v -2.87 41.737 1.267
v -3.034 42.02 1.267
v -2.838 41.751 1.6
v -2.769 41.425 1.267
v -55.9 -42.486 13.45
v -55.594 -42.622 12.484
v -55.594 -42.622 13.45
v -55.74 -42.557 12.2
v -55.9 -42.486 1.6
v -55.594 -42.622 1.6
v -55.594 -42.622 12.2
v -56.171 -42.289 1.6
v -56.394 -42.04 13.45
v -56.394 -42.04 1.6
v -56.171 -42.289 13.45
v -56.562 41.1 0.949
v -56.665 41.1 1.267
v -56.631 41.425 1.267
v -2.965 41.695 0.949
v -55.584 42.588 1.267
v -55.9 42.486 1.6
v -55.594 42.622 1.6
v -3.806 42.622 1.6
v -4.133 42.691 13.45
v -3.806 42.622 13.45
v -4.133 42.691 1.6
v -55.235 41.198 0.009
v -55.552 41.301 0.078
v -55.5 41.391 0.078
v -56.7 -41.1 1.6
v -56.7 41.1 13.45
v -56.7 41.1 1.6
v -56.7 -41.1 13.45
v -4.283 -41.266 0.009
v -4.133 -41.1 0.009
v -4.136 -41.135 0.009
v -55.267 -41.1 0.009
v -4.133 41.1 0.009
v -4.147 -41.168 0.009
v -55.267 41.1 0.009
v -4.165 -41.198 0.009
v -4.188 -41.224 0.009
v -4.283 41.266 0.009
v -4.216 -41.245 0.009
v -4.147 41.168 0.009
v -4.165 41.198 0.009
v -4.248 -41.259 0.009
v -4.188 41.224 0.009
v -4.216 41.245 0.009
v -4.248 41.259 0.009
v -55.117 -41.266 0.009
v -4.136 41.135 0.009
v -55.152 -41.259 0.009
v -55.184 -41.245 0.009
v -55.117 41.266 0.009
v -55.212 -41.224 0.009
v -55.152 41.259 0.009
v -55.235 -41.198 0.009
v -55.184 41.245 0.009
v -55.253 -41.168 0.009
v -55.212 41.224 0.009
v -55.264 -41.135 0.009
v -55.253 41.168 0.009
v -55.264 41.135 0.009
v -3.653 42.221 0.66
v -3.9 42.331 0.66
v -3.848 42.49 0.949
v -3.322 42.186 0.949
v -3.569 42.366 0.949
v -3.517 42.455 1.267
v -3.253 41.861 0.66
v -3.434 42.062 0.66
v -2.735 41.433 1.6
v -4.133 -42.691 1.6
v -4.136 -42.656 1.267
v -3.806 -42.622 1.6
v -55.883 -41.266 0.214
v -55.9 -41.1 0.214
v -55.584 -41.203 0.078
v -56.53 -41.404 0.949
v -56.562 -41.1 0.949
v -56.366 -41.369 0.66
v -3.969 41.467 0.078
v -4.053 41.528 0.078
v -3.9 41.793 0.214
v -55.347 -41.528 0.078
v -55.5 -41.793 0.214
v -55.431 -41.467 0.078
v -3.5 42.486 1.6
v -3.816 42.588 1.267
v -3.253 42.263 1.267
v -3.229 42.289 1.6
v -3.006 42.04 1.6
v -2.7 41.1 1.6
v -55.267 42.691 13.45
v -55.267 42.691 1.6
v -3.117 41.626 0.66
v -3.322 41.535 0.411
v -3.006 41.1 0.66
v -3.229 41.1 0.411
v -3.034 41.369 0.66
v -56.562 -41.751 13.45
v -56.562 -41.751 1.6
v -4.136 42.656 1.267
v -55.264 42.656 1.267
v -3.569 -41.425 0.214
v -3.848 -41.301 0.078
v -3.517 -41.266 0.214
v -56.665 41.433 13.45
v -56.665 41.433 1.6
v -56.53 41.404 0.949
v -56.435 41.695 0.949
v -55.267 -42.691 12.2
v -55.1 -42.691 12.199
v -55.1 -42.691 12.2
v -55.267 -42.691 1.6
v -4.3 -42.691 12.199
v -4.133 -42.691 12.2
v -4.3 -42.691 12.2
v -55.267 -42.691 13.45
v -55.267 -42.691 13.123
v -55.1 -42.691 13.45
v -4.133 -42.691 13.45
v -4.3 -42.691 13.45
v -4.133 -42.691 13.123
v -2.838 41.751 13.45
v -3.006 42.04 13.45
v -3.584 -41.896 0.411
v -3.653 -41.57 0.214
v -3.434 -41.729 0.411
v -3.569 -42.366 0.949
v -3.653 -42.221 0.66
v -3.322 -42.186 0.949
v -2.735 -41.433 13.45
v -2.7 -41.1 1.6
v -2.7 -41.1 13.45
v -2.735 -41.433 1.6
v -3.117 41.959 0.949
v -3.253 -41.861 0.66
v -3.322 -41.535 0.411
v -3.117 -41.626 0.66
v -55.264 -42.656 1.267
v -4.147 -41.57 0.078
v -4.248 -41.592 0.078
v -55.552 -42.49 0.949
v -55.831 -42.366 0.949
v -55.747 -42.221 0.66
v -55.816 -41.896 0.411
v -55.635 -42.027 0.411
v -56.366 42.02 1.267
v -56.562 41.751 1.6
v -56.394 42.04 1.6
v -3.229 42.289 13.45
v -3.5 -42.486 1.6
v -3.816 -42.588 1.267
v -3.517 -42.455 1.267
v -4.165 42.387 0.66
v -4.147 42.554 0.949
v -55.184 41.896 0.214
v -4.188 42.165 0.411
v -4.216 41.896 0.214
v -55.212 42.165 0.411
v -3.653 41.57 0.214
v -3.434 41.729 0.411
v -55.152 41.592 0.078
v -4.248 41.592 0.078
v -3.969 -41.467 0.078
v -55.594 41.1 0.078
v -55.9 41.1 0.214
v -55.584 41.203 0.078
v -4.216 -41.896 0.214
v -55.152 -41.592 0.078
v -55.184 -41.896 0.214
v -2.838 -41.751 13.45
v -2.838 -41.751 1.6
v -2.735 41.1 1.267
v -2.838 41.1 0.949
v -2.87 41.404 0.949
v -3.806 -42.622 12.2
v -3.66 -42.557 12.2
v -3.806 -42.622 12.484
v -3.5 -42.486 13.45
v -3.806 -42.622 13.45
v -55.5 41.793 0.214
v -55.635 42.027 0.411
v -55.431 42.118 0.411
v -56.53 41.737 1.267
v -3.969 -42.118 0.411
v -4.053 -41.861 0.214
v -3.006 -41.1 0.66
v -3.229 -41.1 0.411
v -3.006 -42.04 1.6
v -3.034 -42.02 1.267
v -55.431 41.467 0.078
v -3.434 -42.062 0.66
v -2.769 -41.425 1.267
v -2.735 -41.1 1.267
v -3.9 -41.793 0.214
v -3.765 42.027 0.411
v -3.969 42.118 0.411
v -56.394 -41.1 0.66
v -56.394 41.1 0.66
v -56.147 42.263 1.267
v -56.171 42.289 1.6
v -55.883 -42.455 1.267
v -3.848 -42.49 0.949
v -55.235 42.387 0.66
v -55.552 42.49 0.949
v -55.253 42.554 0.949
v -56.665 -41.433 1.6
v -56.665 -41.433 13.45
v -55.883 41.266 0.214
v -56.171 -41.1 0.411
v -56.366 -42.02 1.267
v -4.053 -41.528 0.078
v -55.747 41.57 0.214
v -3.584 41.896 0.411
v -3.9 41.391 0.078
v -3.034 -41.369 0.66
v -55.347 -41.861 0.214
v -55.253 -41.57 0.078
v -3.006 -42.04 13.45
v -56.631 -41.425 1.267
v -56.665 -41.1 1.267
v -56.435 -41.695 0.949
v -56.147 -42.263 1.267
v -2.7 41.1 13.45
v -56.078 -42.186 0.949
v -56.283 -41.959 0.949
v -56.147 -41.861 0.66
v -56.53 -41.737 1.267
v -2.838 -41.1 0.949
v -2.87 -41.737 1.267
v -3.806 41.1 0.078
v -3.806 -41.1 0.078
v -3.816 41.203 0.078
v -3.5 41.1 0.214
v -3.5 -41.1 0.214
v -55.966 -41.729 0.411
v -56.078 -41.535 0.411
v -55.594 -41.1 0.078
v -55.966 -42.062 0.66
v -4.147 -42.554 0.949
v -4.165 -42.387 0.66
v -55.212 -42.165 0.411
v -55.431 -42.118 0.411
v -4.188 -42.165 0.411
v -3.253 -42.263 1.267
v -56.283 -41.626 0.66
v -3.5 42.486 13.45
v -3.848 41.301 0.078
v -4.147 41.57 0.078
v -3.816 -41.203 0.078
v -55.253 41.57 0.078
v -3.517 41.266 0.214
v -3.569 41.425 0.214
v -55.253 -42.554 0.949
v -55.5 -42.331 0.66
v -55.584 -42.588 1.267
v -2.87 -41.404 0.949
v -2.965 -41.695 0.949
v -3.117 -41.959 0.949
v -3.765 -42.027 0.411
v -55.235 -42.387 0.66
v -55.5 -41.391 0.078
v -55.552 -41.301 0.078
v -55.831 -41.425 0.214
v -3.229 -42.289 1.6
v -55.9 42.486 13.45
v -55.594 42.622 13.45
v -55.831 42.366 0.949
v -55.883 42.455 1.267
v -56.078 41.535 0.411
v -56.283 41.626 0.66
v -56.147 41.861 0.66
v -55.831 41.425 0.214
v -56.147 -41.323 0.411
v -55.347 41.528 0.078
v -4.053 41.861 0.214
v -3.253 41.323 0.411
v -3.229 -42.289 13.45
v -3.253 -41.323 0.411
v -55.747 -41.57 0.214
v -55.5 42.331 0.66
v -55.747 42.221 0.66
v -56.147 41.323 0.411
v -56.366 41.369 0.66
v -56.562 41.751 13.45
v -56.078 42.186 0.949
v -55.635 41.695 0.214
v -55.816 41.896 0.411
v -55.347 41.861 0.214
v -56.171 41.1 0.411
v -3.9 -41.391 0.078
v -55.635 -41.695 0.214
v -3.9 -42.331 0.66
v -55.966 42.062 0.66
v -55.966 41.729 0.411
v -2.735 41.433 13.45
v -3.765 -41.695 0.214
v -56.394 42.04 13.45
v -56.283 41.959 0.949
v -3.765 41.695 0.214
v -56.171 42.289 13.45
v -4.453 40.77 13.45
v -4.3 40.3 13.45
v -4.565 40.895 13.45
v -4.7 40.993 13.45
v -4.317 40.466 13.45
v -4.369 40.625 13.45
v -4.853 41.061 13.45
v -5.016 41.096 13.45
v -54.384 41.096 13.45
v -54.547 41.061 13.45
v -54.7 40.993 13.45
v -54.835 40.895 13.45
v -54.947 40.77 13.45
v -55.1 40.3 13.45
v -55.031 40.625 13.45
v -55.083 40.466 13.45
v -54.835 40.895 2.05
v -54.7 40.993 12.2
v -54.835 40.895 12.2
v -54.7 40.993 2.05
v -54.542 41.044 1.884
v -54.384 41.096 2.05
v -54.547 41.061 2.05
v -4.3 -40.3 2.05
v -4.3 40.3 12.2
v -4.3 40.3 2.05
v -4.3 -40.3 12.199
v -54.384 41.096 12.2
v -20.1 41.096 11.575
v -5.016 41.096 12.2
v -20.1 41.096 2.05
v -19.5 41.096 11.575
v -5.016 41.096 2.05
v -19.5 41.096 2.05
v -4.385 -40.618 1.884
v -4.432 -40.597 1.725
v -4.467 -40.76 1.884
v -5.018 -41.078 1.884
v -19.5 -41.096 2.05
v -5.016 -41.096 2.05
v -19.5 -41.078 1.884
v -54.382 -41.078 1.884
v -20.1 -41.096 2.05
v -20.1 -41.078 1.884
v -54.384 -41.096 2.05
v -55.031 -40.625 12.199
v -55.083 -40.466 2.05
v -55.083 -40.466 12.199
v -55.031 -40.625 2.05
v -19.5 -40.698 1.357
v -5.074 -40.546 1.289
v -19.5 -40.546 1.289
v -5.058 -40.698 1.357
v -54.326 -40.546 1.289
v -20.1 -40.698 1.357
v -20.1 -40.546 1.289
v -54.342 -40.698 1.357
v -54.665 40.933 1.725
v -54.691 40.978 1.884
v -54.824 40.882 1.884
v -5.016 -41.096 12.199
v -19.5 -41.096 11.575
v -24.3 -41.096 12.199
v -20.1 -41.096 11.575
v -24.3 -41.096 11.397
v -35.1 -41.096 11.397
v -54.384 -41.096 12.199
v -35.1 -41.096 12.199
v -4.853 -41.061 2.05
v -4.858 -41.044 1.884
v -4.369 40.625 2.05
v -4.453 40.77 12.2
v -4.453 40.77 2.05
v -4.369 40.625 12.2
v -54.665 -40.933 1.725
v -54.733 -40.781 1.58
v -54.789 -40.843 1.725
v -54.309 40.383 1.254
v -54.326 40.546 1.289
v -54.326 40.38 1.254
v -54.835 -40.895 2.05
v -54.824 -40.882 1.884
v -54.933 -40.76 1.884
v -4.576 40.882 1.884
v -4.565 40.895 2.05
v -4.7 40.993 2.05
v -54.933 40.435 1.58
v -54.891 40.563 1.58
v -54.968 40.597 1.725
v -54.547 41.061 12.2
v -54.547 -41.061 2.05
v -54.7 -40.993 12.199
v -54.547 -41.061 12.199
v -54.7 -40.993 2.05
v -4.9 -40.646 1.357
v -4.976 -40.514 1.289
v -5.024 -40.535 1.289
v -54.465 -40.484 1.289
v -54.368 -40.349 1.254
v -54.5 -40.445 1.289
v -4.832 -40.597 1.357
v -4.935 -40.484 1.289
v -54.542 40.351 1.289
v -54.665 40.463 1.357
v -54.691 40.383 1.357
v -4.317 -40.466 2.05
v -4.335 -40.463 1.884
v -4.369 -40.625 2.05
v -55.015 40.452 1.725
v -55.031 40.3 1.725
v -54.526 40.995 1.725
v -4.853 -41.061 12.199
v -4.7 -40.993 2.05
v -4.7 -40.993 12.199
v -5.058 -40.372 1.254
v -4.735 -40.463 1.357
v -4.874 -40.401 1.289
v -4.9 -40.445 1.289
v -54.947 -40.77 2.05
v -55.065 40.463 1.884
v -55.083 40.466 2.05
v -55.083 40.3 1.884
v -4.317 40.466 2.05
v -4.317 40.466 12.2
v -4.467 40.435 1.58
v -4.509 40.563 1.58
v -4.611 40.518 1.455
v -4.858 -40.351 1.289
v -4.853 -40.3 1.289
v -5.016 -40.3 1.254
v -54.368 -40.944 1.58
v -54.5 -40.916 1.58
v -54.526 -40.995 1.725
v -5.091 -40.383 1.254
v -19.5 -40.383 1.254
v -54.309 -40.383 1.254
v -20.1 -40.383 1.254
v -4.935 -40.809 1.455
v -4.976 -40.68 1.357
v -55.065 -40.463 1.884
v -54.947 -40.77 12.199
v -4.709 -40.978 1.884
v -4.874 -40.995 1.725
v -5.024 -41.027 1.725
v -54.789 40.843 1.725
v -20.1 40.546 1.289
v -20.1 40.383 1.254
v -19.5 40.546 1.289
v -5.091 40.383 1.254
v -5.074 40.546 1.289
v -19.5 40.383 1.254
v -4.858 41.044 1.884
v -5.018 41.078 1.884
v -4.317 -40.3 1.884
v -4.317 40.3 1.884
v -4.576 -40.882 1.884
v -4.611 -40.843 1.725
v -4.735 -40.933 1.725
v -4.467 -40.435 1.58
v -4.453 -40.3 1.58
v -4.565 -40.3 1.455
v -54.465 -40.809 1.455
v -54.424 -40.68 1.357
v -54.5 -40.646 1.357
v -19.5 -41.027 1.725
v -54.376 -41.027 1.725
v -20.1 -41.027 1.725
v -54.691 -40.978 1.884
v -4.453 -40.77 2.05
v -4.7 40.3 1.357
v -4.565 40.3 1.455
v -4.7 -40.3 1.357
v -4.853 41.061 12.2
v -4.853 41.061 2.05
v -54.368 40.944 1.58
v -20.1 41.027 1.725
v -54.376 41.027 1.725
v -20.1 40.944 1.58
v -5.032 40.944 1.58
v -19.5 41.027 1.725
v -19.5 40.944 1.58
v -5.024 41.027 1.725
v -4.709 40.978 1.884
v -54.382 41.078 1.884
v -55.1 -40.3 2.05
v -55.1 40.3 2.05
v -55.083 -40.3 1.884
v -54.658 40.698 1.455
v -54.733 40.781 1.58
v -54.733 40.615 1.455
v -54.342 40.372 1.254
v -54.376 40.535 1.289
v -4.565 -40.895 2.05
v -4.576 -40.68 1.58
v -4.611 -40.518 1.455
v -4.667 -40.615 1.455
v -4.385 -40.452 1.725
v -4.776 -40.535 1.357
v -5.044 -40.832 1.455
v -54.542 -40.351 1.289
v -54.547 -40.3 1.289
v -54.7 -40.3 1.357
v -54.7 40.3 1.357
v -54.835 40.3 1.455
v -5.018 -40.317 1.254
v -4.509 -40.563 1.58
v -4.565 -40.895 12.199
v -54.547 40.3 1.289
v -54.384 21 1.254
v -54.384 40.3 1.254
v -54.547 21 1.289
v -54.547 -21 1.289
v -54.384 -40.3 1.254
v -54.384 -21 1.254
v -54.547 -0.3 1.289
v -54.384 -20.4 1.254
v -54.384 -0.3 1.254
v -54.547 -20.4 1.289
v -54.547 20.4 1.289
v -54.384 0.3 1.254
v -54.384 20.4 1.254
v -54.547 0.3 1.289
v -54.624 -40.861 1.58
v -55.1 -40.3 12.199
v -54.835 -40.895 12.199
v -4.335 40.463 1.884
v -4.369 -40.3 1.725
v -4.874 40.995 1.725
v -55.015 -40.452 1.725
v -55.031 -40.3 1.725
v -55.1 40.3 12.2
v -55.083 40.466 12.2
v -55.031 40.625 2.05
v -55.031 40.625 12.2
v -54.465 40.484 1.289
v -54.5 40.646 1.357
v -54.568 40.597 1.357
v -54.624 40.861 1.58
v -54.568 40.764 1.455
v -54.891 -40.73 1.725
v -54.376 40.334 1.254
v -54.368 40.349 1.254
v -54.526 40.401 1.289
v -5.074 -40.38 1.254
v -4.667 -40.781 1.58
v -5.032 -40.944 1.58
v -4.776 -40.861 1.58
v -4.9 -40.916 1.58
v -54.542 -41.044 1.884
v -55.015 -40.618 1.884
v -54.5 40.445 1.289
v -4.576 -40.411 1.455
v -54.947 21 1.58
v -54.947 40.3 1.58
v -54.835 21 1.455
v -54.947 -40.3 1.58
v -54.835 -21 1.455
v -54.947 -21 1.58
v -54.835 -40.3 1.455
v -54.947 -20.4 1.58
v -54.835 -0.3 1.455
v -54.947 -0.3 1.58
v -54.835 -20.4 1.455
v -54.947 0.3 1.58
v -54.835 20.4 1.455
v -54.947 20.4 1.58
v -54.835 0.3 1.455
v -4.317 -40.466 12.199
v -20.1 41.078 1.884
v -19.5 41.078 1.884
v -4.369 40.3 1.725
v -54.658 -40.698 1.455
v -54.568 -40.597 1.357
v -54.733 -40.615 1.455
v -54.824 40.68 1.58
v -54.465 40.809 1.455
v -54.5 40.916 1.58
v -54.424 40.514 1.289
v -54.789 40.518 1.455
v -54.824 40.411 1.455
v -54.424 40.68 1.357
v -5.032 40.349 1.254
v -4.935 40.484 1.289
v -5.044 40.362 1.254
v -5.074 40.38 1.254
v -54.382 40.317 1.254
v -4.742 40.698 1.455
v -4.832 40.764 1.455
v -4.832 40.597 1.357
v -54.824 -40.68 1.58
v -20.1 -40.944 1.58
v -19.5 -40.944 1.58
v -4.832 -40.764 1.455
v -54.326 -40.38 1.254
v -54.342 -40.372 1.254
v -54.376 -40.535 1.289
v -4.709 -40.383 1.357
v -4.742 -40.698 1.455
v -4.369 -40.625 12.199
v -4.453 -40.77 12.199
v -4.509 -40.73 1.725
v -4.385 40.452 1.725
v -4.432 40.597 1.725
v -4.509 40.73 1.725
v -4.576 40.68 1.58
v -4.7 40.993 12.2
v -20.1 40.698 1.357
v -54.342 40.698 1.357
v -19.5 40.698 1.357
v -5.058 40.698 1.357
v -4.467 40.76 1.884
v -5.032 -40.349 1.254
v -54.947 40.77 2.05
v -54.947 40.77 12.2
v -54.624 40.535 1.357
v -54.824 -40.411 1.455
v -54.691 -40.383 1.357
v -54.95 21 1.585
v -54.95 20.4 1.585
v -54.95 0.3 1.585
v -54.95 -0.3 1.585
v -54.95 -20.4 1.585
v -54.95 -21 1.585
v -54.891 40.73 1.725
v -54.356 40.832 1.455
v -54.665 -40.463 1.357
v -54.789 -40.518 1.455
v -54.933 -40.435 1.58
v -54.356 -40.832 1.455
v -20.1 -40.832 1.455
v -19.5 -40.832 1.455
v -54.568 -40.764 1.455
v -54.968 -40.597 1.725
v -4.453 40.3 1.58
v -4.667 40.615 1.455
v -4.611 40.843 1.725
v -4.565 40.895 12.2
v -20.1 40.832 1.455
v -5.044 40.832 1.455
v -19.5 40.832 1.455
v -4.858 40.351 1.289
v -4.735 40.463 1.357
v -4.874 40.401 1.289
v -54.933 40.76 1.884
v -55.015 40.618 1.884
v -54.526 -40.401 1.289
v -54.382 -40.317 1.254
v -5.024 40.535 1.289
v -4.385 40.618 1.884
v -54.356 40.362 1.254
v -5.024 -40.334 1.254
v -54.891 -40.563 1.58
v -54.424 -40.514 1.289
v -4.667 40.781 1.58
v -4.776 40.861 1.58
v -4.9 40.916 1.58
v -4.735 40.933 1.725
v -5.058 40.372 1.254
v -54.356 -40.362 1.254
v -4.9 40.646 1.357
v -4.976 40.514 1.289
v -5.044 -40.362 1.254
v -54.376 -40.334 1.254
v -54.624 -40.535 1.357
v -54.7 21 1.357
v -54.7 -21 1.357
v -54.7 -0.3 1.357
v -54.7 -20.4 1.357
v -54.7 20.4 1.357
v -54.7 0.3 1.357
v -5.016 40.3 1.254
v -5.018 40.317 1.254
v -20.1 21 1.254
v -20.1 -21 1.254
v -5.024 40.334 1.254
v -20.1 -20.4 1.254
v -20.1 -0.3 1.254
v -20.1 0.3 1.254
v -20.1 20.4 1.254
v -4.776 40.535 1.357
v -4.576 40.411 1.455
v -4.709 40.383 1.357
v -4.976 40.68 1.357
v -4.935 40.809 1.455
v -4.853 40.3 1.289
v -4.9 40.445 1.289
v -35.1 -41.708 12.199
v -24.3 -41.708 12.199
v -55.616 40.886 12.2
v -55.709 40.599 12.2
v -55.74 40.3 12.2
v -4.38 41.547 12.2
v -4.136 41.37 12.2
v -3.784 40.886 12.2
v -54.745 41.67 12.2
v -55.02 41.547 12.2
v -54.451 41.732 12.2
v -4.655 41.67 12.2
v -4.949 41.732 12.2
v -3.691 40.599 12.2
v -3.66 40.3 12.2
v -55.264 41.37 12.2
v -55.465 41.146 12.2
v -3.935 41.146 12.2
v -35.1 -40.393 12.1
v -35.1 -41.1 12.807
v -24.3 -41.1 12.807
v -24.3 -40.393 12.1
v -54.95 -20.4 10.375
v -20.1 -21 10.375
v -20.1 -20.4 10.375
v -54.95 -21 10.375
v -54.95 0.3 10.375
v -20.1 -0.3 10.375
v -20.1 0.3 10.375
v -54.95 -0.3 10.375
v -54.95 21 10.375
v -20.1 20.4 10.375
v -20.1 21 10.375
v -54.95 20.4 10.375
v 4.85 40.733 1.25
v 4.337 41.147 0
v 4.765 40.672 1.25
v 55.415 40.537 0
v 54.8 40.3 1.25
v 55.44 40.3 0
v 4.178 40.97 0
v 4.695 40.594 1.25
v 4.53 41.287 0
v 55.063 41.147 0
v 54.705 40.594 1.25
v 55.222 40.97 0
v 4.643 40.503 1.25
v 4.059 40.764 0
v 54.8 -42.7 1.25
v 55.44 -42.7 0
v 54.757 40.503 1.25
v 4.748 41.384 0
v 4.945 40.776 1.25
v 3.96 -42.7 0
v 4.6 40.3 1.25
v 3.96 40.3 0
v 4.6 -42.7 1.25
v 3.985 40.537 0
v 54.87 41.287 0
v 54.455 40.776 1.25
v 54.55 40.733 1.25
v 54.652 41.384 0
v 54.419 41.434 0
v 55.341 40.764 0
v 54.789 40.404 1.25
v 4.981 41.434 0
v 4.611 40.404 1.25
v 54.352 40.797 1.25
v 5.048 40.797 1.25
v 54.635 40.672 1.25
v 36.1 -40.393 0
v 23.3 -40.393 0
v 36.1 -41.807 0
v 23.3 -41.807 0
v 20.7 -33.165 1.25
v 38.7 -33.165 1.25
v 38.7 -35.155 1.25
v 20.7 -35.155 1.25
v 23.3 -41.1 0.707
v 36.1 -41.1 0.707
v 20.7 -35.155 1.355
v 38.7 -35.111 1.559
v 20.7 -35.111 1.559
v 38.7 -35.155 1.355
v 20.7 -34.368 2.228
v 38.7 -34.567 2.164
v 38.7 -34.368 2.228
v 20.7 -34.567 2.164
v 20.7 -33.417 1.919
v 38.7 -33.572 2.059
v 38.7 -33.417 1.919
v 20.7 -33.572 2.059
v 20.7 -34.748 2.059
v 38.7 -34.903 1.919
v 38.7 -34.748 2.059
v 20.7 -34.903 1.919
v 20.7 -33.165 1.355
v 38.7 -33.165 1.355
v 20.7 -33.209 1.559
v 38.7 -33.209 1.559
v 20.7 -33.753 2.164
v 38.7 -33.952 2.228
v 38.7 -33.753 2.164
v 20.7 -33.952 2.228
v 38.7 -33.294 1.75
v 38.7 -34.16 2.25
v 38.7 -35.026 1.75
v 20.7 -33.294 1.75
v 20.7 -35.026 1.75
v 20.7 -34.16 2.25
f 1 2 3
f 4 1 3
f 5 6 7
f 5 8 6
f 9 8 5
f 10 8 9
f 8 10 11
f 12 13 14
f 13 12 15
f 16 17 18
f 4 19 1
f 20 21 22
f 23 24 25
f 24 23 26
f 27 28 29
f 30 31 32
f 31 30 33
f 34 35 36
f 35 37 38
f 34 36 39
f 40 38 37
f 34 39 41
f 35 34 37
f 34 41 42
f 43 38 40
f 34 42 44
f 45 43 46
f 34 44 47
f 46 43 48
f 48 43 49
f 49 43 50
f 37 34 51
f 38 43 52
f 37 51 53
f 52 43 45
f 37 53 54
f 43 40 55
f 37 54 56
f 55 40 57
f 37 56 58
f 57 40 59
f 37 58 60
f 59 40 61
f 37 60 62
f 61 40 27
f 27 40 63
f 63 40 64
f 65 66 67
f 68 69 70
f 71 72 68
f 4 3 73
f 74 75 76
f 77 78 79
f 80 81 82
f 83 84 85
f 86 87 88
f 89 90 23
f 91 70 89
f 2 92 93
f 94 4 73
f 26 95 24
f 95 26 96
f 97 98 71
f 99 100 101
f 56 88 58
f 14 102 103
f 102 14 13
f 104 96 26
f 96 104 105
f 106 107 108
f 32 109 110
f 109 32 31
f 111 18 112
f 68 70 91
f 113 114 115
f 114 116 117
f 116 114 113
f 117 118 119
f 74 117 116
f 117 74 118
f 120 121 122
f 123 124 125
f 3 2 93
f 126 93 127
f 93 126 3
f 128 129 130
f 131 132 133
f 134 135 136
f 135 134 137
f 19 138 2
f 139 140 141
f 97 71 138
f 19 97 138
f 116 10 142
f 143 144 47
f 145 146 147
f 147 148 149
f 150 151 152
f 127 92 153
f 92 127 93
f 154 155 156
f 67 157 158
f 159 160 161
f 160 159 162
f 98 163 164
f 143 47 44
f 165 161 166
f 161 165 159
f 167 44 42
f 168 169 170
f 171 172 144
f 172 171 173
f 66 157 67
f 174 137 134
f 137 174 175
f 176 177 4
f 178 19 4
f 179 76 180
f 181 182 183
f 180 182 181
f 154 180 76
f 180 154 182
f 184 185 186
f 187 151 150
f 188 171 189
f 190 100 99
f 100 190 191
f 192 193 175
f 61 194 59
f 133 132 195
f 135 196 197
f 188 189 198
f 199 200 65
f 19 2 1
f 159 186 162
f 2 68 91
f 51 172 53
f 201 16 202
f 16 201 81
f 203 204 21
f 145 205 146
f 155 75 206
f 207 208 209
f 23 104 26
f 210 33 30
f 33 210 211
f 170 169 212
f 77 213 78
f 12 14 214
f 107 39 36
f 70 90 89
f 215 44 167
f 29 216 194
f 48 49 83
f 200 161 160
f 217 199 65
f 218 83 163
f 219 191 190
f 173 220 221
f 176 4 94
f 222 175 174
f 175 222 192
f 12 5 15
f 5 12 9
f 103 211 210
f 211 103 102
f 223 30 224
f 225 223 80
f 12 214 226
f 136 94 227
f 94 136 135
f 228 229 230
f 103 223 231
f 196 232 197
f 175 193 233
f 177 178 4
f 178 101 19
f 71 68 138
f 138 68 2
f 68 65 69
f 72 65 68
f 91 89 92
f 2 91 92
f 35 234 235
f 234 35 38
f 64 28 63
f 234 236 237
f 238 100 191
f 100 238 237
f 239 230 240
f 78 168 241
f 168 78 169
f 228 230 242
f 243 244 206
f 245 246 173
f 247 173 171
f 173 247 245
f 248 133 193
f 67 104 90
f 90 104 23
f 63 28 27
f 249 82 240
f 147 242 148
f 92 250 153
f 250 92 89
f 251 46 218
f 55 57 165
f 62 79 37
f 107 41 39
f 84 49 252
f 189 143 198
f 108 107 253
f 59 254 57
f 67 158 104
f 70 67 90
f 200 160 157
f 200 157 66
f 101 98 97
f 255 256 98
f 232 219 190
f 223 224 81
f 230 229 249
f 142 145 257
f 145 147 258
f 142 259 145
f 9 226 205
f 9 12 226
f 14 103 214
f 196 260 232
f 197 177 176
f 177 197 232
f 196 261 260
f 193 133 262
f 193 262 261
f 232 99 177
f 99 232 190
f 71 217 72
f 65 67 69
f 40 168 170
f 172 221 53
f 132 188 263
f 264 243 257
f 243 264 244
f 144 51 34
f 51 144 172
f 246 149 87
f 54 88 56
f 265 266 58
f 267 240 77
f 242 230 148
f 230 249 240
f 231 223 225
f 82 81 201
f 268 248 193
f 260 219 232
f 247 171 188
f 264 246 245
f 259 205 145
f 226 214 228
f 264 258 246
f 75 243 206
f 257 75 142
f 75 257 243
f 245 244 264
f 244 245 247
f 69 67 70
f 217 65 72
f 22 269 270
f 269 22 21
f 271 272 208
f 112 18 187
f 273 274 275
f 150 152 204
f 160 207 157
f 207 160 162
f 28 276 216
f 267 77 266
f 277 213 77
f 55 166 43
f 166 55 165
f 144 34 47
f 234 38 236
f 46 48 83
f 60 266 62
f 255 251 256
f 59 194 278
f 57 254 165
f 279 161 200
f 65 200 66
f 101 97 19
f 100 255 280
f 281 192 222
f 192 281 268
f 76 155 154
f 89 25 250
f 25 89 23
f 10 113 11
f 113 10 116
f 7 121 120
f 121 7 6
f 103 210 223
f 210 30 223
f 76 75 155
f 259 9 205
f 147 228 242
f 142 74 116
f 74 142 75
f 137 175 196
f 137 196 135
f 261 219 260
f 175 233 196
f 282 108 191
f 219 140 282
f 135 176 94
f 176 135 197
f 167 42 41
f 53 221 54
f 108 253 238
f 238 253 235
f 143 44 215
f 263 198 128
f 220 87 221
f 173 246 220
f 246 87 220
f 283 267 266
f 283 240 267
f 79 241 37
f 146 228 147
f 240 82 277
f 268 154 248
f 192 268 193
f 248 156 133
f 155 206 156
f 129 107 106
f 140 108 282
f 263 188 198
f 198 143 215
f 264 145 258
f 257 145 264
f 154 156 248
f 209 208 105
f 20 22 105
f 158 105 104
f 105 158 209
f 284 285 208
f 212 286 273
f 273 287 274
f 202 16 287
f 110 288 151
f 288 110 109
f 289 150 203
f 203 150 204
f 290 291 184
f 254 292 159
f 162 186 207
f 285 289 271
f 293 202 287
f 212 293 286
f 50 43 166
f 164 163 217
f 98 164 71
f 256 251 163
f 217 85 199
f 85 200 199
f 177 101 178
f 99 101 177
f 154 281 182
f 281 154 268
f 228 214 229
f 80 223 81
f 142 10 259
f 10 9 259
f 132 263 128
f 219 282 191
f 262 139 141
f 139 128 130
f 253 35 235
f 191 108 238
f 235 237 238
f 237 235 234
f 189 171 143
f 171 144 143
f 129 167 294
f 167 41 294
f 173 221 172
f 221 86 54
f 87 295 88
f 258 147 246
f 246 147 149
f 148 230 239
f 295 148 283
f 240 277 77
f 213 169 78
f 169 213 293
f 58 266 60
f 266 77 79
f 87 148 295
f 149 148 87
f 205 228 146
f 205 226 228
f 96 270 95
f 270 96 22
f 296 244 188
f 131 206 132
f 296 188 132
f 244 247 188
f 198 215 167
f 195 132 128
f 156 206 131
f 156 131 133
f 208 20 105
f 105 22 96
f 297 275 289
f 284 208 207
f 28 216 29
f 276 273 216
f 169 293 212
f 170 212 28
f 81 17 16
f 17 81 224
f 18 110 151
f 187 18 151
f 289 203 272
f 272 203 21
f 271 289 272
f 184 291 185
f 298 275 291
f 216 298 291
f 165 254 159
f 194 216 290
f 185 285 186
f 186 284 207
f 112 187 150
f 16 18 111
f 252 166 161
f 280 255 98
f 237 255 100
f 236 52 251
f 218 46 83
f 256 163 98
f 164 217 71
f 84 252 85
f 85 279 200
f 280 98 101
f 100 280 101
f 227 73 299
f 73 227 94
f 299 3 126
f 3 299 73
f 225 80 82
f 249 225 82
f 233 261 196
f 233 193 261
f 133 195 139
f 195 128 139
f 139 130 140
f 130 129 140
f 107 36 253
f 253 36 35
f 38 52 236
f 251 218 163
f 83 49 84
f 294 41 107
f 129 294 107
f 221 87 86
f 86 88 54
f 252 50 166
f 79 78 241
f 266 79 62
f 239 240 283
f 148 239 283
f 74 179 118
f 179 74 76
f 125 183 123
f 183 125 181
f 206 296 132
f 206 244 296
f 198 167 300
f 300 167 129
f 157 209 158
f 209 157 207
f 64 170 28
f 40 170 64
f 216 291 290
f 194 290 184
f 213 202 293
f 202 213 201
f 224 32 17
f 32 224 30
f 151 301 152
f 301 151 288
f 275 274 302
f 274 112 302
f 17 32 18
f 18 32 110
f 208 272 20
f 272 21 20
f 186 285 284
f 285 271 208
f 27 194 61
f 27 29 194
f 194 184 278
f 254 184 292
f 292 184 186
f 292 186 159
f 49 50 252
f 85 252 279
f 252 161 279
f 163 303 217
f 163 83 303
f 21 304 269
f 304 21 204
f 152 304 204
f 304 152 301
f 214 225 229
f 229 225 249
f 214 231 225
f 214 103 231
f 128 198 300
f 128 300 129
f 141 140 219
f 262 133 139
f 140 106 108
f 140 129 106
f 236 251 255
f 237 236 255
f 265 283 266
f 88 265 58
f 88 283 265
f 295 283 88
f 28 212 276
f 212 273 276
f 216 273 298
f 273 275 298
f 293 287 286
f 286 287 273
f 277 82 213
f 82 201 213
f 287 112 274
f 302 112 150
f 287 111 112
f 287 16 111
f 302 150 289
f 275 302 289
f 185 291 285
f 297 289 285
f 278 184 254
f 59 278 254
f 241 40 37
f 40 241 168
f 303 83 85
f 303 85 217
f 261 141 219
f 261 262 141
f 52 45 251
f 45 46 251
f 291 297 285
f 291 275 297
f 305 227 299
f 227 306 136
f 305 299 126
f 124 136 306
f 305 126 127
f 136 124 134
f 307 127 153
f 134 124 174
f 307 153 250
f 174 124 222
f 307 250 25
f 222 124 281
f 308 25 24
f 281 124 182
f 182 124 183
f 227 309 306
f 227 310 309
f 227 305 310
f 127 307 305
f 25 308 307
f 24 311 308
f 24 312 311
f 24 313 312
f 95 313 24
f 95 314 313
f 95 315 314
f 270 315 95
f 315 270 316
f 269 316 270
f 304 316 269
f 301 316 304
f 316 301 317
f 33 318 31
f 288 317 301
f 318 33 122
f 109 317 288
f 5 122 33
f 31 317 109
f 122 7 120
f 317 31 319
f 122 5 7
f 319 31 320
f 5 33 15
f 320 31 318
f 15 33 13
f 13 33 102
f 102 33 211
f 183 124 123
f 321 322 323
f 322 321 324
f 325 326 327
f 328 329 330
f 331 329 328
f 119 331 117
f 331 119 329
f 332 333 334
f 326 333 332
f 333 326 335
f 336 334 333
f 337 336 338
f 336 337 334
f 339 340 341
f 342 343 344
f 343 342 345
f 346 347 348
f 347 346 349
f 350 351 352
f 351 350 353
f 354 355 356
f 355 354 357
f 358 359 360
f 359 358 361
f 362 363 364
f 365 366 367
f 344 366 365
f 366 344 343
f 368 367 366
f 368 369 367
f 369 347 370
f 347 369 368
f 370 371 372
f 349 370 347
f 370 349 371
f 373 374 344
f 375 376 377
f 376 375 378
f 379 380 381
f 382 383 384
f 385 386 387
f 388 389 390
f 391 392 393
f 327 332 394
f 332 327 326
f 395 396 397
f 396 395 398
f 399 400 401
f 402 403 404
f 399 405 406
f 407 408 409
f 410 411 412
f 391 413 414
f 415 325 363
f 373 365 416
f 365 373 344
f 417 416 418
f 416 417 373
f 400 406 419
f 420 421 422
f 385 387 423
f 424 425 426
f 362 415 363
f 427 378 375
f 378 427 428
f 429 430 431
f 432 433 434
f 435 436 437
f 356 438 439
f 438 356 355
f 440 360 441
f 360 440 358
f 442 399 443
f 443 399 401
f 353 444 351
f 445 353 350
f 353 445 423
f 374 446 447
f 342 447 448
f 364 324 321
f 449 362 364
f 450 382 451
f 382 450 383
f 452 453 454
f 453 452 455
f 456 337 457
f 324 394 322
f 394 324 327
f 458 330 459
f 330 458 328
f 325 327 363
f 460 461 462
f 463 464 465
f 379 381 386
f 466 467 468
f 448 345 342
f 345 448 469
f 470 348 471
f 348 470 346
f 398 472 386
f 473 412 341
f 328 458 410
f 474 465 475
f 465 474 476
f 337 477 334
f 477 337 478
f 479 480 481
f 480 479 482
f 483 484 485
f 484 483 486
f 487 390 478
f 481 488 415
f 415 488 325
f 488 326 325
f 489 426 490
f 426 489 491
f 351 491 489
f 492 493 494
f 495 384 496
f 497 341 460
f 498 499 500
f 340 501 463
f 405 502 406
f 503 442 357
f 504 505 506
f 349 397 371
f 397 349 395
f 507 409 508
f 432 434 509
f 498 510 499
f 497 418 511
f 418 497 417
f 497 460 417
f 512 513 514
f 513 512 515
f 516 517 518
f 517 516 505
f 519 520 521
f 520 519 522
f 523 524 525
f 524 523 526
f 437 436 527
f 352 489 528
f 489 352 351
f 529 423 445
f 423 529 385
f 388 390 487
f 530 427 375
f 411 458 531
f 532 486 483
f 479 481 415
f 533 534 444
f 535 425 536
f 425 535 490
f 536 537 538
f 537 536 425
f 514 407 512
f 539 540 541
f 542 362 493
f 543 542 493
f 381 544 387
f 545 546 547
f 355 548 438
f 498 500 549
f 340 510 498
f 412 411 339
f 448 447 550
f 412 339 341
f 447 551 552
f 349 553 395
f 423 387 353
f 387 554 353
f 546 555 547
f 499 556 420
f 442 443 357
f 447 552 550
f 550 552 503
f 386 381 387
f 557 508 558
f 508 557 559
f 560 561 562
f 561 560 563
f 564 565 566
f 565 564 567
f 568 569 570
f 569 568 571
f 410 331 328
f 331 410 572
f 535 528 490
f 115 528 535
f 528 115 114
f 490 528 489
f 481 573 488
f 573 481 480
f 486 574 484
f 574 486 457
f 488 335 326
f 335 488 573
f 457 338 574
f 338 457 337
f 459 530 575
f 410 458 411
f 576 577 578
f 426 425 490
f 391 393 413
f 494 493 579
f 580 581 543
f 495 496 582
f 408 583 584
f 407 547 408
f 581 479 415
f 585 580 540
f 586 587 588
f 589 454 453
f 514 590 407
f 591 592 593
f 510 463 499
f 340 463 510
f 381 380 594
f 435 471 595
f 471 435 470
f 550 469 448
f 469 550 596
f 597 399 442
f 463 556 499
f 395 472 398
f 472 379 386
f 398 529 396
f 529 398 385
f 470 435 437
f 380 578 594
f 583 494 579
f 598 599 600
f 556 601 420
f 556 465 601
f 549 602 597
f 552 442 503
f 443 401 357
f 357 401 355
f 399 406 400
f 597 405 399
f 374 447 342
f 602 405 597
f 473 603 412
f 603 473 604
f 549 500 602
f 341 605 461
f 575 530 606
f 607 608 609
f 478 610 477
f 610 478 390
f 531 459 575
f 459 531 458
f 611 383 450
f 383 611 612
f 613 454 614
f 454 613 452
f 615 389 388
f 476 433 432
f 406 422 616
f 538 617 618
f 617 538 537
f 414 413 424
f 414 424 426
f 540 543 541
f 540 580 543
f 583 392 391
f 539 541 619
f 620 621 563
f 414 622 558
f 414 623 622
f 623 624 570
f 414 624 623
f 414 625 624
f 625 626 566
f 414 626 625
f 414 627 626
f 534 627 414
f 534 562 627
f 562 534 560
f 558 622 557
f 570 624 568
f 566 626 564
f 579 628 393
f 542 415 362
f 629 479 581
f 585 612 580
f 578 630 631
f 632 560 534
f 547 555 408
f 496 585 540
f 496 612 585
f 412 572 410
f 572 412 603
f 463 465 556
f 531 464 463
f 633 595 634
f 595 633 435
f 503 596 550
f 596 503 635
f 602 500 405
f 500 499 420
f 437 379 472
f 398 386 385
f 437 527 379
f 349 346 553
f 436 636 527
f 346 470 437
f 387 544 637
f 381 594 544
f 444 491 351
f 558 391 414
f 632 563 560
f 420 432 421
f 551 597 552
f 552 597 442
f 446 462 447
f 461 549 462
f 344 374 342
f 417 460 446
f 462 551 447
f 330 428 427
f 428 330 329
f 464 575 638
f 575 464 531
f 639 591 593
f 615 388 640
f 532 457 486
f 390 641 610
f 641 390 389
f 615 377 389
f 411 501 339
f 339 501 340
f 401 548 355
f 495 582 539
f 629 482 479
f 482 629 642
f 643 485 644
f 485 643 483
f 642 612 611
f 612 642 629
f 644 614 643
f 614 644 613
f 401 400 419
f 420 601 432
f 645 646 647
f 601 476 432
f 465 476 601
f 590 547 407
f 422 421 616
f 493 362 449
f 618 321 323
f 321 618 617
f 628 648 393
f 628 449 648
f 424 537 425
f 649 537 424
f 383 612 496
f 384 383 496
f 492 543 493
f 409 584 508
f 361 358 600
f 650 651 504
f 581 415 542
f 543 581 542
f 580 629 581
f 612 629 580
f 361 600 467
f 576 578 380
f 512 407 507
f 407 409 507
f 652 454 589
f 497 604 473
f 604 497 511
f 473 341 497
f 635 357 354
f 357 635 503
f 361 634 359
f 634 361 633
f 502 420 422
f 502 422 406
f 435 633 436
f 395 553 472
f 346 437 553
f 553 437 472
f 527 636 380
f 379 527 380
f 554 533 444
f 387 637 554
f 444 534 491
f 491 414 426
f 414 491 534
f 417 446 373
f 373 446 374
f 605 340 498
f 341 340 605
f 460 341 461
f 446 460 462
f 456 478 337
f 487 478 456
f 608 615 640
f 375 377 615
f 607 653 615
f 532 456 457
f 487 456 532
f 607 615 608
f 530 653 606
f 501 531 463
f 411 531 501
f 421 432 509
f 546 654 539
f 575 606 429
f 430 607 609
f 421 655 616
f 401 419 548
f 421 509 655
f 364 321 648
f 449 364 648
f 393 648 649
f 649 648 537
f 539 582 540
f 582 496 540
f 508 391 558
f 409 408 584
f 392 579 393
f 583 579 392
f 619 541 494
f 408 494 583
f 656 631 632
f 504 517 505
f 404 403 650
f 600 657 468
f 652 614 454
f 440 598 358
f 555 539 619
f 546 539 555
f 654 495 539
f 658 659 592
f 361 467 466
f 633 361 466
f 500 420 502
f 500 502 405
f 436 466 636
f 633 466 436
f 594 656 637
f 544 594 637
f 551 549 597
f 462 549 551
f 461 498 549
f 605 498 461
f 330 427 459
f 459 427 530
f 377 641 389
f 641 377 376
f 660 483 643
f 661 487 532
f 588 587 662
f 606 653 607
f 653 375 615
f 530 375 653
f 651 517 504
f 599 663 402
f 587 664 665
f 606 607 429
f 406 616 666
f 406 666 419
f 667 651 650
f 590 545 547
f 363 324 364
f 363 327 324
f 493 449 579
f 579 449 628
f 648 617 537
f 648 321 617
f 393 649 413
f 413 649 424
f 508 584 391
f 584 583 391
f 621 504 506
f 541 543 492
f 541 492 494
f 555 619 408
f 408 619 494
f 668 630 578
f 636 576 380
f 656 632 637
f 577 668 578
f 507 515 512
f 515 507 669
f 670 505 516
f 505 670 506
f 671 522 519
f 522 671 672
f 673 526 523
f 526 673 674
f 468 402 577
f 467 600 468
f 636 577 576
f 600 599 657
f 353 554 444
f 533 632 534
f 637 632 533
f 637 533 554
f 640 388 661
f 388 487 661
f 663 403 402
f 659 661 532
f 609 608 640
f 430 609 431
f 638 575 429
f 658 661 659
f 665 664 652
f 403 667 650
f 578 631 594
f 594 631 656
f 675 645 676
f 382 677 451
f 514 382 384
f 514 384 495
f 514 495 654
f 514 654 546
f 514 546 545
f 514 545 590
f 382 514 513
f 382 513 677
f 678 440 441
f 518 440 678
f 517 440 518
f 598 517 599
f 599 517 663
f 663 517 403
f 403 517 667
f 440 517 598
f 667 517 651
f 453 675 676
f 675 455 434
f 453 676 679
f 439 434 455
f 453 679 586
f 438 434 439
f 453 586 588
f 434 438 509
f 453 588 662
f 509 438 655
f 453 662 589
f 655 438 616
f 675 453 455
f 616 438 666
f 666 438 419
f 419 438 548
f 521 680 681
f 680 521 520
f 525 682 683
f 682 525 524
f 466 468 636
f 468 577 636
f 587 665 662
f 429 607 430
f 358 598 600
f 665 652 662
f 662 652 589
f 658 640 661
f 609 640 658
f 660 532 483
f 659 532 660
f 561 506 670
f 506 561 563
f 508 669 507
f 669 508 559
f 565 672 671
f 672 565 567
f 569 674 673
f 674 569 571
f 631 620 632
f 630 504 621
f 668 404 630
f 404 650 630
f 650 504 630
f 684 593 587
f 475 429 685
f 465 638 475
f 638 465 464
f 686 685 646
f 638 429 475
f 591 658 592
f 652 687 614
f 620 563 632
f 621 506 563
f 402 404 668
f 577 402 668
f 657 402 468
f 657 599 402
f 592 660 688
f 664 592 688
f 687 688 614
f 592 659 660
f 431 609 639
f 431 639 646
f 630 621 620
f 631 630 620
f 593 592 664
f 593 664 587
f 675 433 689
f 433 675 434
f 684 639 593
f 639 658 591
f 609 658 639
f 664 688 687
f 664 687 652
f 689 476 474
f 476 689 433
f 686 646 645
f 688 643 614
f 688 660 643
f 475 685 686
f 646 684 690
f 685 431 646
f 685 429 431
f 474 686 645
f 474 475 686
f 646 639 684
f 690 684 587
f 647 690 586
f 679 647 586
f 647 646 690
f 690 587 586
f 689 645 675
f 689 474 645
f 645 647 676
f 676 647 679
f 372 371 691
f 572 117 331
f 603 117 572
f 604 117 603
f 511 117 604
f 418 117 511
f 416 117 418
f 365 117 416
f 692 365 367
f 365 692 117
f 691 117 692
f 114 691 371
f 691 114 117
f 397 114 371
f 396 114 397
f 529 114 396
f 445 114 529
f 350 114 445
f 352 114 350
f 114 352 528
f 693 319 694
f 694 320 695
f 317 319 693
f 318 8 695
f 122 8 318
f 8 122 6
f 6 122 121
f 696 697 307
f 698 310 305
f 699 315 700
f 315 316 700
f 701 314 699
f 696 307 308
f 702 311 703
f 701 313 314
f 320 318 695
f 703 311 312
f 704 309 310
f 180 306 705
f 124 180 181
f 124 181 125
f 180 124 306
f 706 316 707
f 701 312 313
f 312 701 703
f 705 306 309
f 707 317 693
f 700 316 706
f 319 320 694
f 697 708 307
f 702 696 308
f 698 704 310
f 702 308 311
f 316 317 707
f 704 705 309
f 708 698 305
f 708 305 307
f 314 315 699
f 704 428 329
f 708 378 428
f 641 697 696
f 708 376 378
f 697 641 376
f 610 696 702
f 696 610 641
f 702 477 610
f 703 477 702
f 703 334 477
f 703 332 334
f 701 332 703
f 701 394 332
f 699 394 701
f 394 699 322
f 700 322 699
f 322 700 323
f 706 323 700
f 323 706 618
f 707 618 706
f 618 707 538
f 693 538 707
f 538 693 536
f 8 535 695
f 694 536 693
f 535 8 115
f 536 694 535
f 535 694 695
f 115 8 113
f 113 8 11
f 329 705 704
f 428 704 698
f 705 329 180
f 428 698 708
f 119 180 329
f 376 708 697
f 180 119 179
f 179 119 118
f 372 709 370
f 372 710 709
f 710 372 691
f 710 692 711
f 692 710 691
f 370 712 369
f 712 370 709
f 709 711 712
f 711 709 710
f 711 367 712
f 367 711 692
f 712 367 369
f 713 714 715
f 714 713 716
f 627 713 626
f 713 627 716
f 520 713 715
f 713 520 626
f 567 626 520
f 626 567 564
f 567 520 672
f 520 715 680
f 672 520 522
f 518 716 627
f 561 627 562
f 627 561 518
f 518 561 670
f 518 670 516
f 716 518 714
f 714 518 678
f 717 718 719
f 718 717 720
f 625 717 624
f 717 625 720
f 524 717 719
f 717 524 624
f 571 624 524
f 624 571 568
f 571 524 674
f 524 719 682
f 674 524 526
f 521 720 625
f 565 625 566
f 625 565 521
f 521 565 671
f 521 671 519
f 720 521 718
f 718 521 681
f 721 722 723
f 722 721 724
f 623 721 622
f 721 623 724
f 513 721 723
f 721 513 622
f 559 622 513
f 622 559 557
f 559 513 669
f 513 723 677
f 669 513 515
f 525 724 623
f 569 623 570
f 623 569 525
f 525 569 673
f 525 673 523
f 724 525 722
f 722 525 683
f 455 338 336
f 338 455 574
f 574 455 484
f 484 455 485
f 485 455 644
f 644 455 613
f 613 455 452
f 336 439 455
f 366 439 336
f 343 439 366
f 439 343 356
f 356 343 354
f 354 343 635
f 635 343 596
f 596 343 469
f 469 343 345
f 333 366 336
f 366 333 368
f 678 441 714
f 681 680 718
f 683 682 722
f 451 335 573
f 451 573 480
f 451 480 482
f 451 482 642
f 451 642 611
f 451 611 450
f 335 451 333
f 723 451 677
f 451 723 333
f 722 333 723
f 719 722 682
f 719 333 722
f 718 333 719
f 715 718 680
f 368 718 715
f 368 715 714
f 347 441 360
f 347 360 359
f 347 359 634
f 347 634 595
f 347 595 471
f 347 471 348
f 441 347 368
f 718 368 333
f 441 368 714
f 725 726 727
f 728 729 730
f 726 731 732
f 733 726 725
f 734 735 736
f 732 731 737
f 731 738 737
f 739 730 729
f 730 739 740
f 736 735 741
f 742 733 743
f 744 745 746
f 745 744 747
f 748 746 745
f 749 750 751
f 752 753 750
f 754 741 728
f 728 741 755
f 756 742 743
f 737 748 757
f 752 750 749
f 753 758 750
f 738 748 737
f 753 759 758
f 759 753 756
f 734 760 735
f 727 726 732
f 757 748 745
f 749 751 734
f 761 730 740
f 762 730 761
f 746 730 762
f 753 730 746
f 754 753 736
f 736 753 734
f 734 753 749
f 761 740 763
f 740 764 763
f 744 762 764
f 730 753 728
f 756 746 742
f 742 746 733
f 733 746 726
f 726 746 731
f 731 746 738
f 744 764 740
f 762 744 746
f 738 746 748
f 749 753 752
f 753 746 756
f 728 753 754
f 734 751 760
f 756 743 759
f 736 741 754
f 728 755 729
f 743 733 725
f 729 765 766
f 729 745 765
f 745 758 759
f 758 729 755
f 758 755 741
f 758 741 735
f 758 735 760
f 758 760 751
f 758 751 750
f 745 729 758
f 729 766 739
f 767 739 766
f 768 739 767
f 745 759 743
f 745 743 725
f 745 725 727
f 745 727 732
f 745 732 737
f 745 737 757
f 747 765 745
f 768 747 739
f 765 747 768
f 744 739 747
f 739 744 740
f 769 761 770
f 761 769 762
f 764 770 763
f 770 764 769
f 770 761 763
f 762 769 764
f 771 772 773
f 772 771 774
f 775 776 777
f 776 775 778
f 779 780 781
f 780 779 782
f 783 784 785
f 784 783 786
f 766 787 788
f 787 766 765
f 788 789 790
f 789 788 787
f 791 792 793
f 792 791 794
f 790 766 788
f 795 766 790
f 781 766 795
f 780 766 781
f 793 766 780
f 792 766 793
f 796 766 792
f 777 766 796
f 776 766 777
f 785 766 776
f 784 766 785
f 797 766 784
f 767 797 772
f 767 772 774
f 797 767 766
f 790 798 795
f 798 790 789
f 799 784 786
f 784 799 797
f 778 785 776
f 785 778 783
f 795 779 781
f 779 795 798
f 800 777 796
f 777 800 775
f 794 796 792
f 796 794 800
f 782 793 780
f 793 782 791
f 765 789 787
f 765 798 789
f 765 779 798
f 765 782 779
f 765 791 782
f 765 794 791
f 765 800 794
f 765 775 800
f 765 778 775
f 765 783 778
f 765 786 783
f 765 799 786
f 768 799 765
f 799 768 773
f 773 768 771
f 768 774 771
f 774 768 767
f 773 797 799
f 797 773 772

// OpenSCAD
////----PillBox.scad----
////----OpenSCAD 2015.03-2----
////----2018.09.03----
////----Kijja Chaovanakij----
//
////----defalt box size equals credit card size.

/*[General]*/
//number of fragment[30:low,40:medium,60:high]
$fn=30;
//generate parts
part=3; //[1:box,2:lid,3:both]

/*[Box]*/
//outer box x size[54]
box_xsize=54;
//outer box y size[85.4]
box_ysize=85.4;
//outer box z size[13.45(layer 0=0.25,others=0.20)]
box_zsize=13.45;
//box bottom thickness[1.25(layer 0=0.25,others=0.20)]
box_bottom_thick=1.25;
//outer wall thickness[1.6]
box_wall=1.6;
//inner wall thickness[0.6]
inner_wall=0.6;

/*[lid]*/
//lid thickness[1.25(layer 0=0.25,others=0.20)]
lid_thick=1.25;
//lid & box fit tolerance[0.3]
lid_tol=0.3;

/*[Cell]*/
//number of cell y row[4]
cell_ynum=4;
//cell divider type
cell_divider=1; //[0:no,1:yes]

/*[Plaster Pad]*/
//Plaster Pad x size[35]
pad_xsize=35;
//Plaster Pad z size[1.2]
pad_zsize=1.2;

////----translate var----
//inner box x size
inner_xsize=box_xsize-box_wall*2;
//inner box y size
inner_ysize=box_ysize-box_wall*2;
//inner box z size
inner_zsize=box_zsize-box_bottom_thick-lid_thick;
//cell y size
cell_ysize=(inner_ysize-inner_wall*(cell_ynum-1))/cell_ynum+inner_wall;

////----main----
if (part==1)
  box();
if (part==2)
  lid();
if (part==3){
  translate([-box_xsize*0.55,0,0])
    box();
  translate([box_xsize*0.55,0,-box_zsize+lid_thick])
    lid();
}//i
//

module box(){
  color("SkyBlue"){
  difference(){
//box
    round_bottom_cube(inner_xsize,inner_ysize,box_zsize, box_wall);
//cut inner box
    translate([0,0,box_bottom_thick])
      round_bottom_cube(inner_xsize-box_wall,inner_ysize-box_wall,box_zsize,box_wall/2);
//cut open slide side
    translate([0,-box_ysize/2+box_wall/2,box_zsize-lid_thick/2])
      cube([inner_xsize,box_wall*2,lid_thick+0.002],true);
//cut lip
    translate([0,-box_wall,box_zsize-lid_thick])
      round_corner_frustum(inner_xsize-box_wall,inner_ysize-box_wall+box_wall*2,lid_thick,box_wall*0.9,box_wall/2);
  }//d
//lock
  translate([0,-box_ysize/2+box_wall,box_zsize-lid_thick-0.1])
  rotate([45,0,0])
    cube([box_xsize/5,1,1],true);
  }//c
//cell
  if (cell_divider==1)
    color("tan")
    cell();
}//m
//

module lid(){
  color("orange"){
  difference(){
//lid
    translate([0,-box_wall*2,box_zsize-lid_thick])
      round_corner_frustum(inner_xsize-box_wall,inner_ysize-box_wall+box_wall*4,lid_thick,box_wall*0.9-lid_tol,box_wall/2-lid_tol);
//cut excess lid
    translate([0,-box_ysize/2-box_wall*2,box_zsize-lid_thick/2])
      cube([inner_xsize+box_wall,box_wall*4,lid_thick+0.005],true);
//cut lock
    translate([0,-box_ysize/2+box_wall,box_zsize-lid_thick])
    rotate([45,0,0])
      cube([box_xsize/5+2,1,1],true);
  }//d
//slider bar
  translate([0,-box_ysize/2.5,box_zsize])
  rotate([0,90,0])
    cylinder(box_xsize/3,lid_thick*0.8,lid_thick*0.8,true);
  }//c
}//m
//

module cell(){
//long thin wall  
  translate([-inner_xsize/2+pad_xsize+inner_wall/2,0,inner_zsize/2+box_bottom_thick/2])
    cube([inner_wall,inner_ysize,inner_zsize],true);
//cross thin wall
  translate([-inner_xsize/2+pad_xsize/2+inner_wall/2,-inner_ysize/2-inner_wall/2,inner_zsize/2+box_bottom_thick/2])
    for (i=[1:1:cell_ynum-1])
      translate([0,cell_ysize*i,-pad_zsize/2])
        cube([pad_xsize+inner_wall/2,inner_wall,inner_zsize-pad_zsize],true);
}//m
//

module round_corner_frustum(xwid,ywid,height,bradius,tradius){
  hull(){
    for (i=[-xwid/2,xwid/2])
    for (j=[-ywid/2,ywid/2])
      translate([i,j,0])
        cylinder(height,bradius,tradius);
  }//h
}//m
//

module round_bottom_cube(xwid,ywid,height,radius){
  hull(){
    for (i=[-xwid/2,xwid/2])
    for (j=[-ywid/2,ywid/2]){
      translate([i,j,radius])
        sphere(radius);
      translate([i,j,radius])
        cylinder(height-radius,radius,radius);
    }//f
  }//h
}//m
//
